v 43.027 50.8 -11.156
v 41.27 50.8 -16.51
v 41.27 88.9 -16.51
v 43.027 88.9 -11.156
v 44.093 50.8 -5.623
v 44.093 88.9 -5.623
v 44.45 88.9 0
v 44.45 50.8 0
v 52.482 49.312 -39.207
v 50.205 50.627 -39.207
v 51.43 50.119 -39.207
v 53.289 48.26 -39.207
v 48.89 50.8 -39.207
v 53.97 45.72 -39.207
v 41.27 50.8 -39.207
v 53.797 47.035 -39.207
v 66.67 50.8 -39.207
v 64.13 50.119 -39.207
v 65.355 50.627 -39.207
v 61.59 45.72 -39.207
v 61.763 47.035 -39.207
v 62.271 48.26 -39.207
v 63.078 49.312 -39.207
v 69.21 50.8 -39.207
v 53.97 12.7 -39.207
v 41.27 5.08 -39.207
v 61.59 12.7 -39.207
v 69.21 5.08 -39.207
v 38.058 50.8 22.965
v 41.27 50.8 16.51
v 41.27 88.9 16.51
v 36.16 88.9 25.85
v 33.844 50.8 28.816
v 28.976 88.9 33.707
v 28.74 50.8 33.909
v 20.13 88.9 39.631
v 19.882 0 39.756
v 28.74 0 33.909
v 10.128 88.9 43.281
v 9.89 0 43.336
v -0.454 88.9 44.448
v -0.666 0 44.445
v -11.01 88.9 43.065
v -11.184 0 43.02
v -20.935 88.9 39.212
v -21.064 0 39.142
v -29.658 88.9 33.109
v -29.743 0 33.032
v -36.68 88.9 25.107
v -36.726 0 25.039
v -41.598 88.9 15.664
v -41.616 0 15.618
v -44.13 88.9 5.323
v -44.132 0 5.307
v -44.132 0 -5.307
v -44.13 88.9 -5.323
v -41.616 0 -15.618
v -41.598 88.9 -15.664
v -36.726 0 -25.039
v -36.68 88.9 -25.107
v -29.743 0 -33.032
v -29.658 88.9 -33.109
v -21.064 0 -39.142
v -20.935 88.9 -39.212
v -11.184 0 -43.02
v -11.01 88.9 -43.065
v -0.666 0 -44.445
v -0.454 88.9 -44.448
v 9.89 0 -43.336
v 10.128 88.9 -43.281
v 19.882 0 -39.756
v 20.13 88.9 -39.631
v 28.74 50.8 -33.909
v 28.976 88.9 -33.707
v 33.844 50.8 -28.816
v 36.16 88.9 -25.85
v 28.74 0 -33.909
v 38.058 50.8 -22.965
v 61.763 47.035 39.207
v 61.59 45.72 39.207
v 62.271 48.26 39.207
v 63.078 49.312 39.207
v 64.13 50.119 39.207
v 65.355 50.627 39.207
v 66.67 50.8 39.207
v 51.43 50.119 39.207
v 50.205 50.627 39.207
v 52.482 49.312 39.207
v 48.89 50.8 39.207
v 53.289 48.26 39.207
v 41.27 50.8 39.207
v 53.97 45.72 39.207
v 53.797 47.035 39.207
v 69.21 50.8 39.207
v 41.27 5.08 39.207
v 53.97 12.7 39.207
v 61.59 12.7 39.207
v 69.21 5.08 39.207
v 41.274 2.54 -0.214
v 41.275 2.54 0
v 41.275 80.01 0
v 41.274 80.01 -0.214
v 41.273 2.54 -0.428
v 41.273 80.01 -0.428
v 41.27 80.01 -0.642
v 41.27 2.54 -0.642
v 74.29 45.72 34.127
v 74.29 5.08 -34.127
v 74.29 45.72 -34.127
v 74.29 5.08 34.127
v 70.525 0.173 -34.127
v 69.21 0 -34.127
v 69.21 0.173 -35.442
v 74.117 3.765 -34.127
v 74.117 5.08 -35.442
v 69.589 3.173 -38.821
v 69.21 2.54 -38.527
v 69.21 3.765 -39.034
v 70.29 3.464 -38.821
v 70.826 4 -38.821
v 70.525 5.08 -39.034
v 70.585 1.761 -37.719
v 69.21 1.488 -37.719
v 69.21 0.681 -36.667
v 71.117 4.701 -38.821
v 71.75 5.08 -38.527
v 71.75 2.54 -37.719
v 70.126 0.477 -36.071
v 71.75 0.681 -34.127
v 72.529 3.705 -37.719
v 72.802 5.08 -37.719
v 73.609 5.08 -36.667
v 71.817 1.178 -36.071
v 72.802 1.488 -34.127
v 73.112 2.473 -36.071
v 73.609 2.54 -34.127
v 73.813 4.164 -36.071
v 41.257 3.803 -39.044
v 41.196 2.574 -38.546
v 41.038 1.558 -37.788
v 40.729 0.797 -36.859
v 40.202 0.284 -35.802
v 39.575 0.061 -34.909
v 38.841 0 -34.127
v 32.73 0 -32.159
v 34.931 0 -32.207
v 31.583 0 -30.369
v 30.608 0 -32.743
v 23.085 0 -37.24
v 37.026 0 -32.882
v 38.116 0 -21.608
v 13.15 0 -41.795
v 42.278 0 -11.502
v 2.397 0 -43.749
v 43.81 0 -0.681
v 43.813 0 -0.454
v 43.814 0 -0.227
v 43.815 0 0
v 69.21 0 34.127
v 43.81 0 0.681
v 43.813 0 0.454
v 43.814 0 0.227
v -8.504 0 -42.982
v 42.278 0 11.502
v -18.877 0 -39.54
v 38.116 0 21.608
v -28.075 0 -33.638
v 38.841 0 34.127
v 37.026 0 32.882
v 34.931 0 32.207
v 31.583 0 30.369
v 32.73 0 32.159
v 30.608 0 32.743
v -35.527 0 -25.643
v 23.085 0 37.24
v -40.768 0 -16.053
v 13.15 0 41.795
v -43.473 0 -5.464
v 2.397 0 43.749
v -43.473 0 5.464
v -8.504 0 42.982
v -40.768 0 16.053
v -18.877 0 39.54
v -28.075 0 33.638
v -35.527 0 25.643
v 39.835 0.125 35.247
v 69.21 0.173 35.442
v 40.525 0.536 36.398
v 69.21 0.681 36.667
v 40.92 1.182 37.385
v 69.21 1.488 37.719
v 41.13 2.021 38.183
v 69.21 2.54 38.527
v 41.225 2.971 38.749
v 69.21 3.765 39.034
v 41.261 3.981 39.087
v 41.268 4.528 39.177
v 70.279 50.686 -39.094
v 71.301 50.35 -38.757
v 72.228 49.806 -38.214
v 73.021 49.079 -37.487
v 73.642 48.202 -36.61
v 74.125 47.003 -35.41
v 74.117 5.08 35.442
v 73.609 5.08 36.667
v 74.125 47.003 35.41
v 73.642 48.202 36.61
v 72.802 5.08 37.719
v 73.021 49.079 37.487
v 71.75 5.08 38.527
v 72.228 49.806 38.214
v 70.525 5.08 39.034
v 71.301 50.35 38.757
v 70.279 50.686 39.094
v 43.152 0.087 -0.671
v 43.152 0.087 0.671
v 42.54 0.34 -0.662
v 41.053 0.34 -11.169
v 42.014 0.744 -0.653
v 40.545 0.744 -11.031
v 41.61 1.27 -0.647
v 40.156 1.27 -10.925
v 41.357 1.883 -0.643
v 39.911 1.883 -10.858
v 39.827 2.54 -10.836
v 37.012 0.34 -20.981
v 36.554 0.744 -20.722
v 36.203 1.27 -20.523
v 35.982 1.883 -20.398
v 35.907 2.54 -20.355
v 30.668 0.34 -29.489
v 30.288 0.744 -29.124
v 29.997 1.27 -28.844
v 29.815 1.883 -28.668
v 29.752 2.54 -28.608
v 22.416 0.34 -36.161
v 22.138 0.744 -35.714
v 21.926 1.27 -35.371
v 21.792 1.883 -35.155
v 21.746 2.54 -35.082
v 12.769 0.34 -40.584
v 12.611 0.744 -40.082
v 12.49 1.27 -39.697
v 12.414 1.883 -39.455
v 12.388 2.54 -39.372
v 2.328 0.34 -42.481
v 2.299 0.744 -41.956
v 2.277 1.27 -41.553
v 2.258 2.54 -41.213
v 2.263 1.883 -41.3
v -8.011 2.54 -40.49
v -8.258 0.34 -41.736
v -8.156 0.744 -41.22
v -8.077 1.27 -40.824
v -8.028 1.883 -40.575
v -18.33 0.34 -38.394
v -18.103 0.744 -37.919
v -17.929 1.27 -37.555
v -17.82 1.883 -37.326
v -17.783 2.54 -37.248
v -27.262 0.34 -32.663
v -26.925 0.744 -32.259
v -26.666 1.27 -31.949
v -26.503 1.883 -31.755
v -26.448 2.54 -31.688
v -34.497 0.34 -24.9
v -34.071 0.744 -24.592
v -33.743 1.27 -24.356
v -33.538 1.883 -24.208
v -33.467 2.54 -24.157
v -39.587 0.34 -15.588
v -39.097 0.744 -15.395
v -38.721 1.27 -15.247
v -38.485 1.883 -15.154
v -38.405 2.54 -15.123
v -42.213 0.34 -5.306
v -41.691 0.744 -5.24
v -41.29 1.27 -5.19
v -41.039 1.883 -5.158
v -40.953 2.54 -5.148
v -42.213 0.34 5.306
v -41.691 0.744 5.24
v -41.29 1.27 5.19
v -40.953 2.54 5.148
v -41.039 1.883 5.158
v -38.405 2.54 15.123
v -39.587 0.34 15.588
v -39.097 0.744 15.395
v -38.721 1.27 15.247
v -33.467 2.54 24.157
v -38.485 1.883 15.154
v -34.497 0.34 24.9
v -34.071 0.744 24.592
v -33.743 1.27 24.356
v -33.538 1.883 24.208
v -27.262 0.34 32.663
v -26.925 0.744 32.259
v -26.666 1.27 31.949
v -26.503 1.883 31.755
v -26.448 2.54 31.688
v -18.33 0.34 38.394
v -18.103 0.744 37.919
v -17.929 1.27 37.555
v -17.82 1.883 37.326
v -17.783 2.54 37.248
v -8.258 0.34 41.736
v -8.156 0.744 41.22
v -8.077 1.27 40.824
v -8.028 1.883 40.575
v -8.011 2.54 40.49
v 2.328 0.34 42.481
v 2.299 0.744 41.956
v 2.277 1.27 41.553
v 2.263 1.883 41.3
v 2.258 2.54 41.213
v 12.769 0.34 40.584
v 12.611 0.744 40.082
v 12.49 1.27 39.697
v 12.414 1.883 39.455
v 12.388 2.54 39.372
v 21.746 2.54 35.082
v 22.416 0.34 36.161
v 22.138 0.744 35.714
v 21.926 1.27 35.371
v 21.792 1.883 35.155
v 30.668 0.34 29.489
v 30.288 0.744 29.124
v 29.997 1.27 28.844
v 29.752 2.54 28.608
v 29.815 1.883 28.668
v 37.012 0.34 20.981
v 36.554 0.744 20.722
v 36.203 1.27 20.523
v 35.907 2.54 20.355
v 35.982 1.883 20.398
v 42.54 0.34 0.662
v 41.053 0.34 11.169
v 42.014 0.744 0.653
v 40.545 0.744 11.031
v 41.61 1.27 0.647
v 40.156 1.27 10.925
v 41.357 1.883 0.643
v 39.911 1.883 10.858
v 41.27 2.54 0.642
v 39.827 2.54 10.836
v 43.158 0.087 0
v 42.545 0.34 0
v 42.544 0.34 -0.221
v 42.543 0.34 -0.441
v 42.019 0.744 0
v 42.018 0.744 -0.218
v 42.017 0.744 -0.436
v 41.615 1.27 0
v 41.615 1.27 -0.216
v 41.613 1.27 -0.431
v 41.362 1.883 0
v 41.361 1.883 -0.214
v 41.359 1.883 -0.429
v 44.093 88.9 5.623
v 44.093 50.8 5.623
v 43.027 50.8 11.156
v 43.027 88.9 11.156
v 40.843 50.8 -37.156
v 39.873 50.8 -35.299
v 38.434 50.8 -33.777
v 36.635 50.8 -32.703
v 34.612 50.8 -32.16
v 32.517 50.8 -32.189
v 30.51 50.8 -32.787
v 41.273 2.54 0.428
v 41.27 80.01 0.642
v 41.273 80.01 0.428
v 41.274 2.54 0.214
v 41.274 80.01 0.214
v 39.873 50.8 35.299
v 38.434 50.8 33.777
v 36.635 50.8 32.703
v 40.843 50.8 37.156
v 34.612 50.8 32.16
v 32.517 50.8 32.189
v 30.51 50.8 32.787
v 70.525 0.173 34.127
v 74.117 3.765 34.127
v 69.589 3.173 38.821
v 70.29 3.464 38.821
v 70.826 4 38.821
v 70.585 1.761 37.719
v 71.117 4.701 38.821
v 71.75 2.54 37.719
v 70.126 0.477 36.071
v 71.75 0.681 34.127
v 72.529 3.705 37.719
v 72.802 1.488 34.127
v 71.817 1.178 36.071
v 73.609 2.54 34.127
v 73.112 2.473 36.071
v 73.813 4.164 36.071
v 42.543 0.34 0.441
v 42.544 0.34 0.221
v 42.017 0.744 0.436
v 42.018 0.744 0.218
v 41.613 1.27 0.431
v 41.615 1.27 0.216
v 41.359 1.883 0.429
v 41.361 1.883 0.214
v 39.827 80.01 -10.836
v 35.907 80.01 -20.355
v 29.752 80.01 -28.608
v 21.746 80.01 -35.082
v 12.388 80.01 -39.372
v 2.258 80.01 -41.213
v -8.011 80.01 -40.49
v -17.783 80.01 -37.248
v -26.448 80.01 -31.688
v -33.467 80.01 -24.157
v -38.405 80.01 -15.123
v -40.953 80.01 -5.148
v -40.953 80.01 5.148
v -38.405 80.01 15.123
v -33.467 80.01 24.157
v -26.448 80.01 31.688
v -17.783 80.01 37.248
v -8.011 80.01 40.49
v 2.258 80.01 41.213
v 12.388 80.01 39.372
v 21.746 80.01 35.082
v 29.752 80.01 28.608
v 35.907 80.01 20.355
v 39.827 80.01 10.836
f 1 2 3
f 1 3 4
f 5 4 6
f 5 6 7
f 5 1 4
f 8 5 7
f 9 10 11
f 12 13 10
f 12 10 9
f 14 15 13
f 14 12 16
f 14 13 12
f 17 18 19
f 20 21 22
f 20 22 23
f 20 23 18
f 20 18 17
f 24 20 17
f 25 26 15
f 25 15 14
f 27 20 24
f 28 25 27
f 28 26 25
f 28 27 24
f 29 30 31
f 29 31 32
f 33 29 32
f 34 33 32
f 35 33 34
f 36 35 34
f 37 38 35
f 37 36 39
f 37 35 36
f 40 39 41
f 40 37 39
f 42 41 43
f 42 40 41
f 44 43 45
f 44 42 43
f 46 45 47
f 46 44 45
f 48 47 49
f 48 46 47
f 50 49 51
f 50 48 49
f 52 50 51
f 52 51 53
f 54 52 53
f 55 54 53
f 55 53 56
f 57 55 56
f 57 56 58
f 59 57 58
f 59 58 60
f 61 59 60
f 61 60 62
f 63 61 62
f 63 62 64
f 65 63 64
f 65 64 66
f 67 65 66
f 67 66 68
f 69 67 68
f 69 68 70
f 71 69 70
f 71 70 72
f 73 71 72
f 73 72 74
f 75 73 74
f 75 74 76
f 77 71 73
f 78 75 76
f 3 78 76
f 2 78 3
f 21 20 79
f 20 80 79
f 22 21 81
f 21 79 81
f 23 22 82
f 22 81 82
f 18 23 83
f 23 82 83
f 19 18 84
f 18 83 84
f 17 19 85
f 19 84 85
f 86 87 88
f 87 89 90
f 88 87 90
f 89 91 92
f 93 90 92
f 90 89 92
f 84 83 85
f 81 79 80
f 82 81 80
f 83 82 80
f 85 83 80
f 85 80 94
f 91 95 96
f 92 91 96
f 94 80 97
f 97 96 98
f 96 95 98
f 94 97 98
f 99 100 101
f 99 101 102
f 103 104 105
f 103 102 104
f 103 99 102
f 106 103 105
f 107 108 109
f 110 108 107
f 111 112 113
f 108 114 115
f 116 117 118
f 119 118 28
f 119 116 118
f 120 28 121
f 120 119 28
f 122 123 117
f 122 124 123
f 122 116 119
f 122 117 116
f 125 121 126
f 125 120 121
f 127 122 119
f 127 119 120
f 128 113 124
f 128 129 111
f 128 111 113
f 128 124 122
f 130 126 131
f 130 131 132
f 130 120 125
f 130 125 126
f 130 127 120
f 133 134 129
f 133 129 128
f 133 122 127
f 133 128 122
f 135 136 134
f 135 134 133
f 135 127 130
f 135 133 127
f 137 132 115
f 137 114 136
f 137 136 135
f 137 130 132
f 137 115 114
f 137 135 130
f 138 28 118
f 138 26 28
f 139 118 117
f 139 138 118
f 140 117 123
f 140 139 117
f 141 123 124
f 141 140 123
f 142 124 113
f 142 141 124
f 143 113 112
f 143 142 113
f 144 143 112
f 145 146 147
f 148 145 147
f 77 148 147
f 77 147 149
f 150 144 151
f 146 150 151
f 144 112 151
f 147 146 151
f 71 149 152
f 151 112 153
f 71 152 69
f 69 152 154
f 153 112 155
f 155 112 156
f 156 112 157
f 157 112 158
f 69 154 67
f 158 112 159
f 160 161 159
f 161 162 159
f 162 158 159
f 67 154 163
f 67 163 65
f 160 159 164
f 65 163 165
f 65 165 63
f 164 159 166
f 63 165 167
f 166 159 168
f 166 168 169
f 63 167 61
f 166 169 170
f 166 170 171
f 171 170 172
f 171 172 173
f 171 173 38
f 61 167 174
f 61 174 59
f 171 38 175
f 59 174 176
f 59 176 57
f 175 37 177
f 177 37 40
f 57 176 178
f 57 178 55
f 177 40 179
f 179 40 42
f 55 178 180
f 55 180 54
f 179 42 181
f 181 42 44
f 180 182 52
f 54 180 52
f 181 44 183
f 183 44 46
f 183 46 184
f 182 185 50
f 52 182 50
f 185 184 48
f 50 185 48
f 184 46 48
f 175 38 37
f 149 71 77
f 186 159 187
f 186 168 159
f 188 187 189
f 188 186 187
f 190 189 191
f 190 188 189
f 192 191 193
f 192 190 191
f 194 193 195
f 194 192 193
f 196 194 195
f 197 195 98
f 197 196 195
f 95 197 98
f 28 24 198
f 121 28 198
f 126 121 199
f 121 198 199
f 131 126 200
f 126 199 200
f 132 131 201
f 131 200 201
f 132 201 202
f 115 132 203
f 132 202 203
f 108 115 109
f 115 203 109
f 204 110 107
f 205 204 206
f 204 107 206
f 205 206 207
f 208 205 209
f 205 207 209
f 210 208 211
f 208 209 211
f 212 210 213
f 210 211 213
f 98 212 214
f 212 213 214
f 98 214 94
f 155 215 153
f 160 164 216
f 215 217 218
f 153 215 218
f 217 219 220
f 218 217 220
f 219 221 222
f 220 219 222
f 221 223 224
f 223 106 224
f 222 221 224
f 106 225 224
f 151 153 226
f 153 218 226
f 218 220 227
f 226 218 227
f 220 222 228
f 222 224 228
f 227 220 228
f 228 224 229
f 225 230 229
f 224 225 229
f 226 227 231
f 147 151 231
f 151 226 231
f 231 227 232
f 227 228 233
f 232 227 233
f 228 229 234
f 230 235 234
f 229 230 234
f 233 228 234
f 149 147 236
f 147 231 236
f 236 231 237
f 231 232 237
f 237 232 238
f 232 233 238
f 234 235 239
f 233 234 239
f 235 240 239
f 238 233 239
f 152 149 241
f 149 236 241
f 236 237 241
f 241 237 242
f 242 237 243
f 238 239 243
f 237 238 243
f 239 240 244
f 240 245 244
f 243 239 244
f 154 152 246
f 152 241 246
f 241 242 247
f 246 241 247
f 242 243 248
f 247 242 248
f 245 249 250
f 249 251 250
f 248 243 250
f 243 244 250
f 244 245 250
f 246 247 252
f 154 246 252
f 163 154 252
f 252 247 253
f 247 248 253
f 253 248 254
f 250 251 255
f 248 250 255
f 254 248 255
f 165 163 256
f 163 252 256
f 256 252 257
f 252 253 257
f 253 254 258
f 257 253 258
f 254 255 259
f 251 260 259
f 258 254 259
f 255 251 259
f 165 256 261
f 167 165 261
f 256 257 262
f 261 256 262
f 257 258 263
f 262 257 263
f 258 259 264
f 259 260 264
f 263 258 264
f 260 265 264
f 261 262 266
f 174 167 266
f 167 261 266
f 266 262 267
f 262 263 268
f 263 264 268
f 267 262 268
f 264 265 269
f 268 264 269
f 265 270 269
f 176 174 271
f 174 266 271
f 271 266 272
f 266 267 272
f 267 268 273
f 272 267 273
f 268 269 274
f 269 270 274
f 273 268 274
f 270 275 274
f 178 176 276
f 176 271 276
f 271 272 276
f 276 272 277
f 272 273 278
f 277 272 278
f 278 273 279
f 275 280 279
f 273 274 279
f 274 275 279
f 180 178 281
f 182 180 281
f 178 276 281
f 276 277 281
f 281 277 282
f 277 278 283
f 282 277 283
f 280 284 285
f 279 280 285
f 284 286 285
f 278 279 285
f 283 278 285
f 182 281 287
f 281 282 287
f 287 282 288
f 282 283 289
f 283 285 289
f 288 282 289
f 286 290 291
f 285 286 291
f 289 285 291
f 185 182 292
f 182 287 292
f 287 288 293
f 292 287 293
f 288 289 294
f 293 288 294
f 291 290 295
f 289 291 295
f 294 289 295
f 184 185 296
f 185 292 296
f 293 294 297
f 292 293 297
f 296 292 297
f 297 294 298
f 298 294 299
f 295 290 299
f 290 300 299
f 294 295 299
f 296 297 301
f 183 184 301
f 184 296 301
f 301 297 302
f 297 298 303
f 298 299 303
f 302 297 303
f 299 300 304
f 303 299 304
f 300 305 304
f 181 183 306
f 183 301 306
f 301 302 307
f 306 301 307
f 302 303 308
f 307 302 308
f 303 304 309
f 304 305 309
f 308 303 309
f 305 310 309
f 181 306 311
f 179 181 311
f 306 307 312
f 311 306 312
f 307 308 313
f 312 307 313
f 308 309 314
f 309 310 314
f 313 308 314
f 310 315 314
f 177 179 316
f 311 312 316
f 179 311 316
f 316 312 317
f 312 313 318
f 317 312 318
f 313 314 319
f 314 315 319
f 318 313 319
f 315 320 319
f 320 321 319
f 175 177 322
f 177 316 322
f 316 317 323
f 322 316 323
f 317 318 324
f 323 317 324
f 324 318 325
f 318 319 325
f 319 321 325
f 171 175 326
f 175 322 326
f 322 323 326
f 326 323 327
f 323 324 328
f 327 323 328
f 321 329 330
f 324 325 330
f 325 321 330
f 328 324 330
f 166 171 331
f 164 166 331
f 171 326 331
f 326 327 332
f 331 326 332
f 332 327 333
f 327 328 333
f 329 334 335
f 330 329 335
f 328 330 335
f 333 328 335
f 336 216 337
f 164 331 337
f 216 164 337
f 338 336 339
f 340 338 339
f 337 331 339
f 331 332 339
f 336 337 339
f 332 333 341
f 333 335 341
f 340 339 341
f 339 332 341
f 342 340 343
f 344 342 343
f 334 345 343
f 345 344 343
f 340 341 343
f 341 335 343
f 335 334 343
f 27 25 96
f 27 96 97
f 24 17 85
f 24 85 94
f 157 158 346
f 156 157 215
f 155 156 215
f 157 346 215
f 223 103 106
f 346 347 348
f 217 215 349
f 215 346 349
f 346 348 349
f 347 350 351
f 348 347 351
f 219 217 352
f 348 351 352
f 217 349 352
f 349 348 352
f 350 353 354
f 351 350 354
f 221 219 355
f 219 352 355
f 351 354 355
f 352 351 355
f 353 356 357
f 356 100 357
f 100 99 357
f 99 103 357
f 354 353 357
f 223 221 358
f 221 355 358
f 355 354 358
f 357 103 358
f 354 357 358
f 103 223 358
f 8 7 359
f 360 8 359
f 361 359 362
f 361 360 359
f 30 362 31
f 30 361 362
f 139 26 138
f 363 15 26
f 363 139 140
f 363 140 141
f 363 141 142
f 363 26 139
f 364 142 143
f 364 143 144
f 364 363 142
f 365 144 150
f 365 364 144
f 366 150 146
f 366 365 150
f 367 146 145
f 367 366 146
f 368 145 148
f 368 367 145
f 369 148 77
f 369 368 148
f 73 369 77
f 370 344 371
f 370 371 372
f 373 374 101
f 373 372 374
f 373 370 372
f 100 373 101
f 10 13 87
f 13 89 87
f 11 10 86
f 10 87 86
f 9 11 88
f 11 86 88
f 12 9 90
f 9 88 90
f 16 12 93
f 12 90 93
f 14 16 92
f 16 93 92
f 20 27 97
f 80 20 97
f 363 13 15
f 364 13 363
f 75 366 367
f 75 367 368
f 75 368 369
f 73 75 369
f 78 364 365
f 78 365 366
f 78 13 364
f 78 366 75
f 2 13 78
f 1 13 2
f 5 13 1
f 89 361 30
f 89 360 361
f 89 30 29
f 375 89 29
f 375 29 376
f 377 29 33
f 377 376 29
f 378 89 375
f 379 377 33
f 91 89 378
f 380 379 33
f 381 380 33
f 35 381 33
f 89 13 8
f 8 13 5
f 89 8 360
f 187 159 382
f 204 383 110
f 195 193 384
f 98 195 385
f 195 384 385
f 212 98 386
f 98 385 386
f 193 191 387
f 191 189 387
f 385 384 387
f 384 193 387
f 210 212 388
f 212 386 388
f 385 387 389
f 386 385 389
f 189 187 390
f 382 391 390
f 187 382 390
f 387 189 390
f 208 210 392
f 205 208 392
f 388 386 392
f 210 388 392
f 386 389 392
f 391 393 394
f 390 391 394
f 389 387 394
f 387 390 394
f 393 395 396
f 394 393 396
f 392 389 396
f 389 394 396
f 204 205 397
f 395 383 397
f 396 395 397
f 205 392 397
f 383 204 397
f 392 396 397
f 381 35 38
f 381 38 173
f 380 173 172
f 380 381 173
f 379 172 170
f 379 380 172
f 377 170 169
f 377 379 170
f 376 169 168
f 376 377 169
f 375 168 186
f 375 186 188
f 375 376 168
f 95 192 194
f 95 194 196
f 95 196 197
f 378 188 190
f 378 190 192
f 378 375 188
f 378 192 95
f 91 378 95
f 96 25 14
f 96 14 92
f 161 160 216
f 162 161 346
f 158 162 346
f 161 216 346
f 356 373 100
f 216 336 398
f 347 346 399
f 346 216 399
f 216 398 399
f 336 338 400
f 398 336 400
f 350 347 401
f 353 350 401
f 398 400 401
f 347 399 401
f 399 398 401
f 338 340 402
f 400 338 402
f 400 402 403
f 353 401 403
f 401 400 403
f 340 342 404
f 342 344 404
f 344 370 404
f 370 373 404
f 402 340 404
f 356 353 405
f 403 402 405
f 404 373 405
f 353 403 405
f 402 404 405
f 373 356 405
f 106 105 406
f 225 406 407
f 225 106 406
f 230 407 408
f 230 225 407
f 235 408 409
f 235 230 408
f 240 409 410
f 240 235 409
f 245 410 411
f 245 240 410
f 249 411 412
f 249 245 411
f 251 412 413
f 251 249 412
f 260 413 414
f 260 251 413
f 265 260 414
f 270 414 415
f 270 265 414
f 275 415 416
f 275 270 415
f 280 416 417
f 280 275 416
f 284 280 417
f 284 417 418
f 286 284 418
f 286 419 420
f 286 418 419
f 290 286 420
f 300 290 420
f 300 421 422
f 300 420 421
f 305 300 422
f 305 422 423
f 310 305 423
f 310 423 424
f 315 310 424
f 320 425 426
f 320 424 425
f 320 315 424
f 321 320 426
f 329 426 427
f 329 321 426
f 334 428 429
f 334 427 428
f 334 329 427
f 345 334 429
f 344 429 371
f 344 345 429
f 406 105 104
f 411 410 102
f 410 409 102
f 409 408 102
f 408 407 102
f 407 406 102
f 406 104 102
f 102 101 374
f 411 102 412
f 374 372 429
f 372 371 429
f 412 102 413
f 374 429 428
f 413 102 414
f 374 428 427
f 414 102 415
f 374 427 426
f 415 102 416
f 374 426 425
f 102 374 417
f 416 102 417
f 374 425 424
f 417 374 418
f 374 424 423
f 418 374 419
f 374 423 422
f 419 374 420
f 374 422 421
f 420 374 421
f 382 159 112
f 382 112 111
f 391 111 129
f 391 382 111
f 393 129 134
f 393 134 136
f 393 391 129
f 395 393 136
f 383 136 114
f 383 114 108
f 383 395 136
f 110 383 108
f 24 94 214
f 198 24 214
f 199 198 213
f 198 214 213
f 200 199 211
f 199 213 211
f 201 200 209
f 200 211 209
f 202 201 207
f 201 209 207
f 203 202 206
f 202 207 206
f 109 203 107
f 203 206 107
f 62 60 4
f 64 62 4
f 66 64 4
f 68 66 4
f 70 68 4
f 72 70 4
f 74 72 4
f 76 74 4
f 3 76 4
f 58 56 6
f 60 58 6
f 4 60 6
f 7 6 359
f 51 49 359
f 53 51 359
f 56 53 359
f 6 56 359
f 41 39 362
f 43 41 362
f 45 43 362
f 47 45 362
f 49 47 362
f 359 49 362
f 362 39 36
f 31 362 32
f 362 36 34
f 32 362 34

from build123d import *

# Parameters (mm, degrees)
F1_DEPTH    = 50.8
F0_W        = 12.7
F0_H        = 78.4147009254
F0_W_2      = 7.62
F2_DEPTH    = 12.7
F3_DEPTH    = 88.9
F5_DEPTH    = 88.9
F7_T1_DEPTH = 50.8
F8_R        = 5.08
F9_R        = 2.54
F11_R       = 44.45
F12_DEPTH   = 8.89


# Not quite as in the source:
# - a fillet or chamfer that OpenCascade refuses, or shapes differently, is made with other operations: its cross-section is extruded or revolved along the edge and cut away or added


with BuildPart() as f1:
    # F0 (on Front) → F1 (new body)
    with BuildSketch(Plane.XZ):
        with BuildLine():
            ThreePointArc((41.2700087631, 16.5102657972), (43.6477627692, 8.4068606055), (44.45, 0))
            ThreePointArc((44.45, 0), (43.6477627692, -8.4068606055), (41.2700087631, -16.5102657972))
            Line((41.2700087631, -16.5102657972), (41.2700087631, -39.2073504627))
            Line((41.2700087631, -39.2073504627), (53.9700087631, -39.2073504627))
            Line((53.9700087631, -39.2073504627), (53.9700087631, 39.2073504627))
            Line((53.9700087631, 39.2073504627), (41.2700087631, 39.2073504627))
            Line((41.2700087631, 39.2073504627), (41.2700087631, 16.5102657972))
        make_face()
    extrude(amount=-F1_DEPTH)



with BuildPart() as f1b:
    # F0 (on Front) → F1, piece 2 (new body)
    with BuildSketch(Plane.XZ):
        with Locations((67.9400087631, 0)):
            Rectangle(F0_W, F0_H)
    extrude(amount=-F1_DEPTH)


with BuildPart() as f1_1:
    add(f1.part)

    add(f1b.part)  # F2 merges F1b
    # F0 (on Front) → F2 (join)
    with BuildSketch(Plane.XZ):
        with Locations((57.7800087631, 0)):
            Rectangle(F0_W_2, F0_H)
    extrude(amount=-F2_DEPTH)

    # F0 (on Front) → F3 (join)
    with BuildSketch(Plane.XZ):
        with BuildLine():
            Line((41.2700087631, 0.6418735824), (41.2700087631, 16.5102657972))
            ThreePointArc((41.2700087631, 16.5102657972), (-44.45, 0), (41.2700087631, -16.5102657972))
            Line((41.2700087631, -16.5102657972), (41.2700087631, -0.6418735824))
            ThreePointArc((41.2700087631, -0.6418735824), (-41.275, 0), (41.2700087631, 0.6418735824))
        make_face()
    extrude(amount=-F3_DEPTH)

    # F4: union 

    # F0 (on Front) → F5 (join)
    with BuildSketch(Plane.XZ):
        with BuildLine():
            ThreePointArc((41.2700087631, -16.5102657972), (43.6477627692, -8.4068606055), (44.45, 0))
            ThreePointArc((44.45, 0), (43.6477627692, 8.4068606055), (41.2700087631, 16.5102657972))
            Line((41.2700087631, 16.5102657972), (41.2700087631, 0.6418735824))
            ThreePointArc((41.2700087631, 0.6418735824), (41.2737521719, 0.3209464941), (41.275, 0))
            ThreePointArc((41.275, 0), (41.2737521719, -0.3209464941), (41.2700087631, -0.6418735824))
            Line((41.2700087631, -0.6418735824), (41.2700087631, -16.5102657972))
        make_face()
    extrude(amount=-F5_DEPTH)

    # F6: union 

    # F7: fillet of radius 7.62 on 2 edges, made by hand

    # F7_s2 → F7_t1 (join)
    with BuildSketch(Plane.XZ.offset(-50.8)):
        with BuildLine():
            ThreePointArc((41.2700087631, -39.2073504627), (36.6353958241, -32.7032366386), (28.7404382359, -33.9085492171))
            ThreePointArc((28.7404382359, -33.9085492171), (36.0699423168, -25.9761768022), (41.2700087631, -16.5102657972))
            Line((41.2700087631, -16.5102657972), (41.2700087631, -39.2073504627))
        make_face()
        with BuildLine():
            ThreePointArc((28.7404382359, 33.9085492171), (36.6353958241, 32.7032366386), (41.2700087631, 39.2073504627))
            Line((41.2700087631, 39.2073504627), (41.2700087631, 16.5102657972))
            ThreePointArc((41.2700087631, 16.5102657972), (36.0699423168, 25.9761768022), (28.7404382359, 33.9085492171))
        make_face()
    extrude(amount=F7_T1_DEPTH)

    # F8
    f8_edges = [f1_1.edges().sort_by_distance(p)[0] for p in [
        (53.970009, 50.8, 0),
        (61.590009, 50.8, 0),
        (74.290009, 0, 0),
        (57.780009, 0, -39.20735),
        (57.780009, 0, 39.20735),
        (74.290009, 50.8, 0),
        (74.290009, 25.4, -39.20735),
        (74.290009, 25.4, 39.20735),
    ]]
    fillet(f8_edges, radius=F8_R)

    # F9
    f9_edges = [f1_1.edges().sort_by_distance(p)[0] for p in [
        (-41.270009, 0, -0.641874),
    ]]
    fillet(f9_edges, radius=F9_R)

    # F11 (on offset) → F12 (join)
    with BuildSketch(Plane(origin=(0, 88.9, 0), x_dir=(-1, 0, 0), z_dir=(0, 1, 0))):
        Circle(F11_R)
    extrude(amount=-F12_DEPTH)


solid = f1_1.part
